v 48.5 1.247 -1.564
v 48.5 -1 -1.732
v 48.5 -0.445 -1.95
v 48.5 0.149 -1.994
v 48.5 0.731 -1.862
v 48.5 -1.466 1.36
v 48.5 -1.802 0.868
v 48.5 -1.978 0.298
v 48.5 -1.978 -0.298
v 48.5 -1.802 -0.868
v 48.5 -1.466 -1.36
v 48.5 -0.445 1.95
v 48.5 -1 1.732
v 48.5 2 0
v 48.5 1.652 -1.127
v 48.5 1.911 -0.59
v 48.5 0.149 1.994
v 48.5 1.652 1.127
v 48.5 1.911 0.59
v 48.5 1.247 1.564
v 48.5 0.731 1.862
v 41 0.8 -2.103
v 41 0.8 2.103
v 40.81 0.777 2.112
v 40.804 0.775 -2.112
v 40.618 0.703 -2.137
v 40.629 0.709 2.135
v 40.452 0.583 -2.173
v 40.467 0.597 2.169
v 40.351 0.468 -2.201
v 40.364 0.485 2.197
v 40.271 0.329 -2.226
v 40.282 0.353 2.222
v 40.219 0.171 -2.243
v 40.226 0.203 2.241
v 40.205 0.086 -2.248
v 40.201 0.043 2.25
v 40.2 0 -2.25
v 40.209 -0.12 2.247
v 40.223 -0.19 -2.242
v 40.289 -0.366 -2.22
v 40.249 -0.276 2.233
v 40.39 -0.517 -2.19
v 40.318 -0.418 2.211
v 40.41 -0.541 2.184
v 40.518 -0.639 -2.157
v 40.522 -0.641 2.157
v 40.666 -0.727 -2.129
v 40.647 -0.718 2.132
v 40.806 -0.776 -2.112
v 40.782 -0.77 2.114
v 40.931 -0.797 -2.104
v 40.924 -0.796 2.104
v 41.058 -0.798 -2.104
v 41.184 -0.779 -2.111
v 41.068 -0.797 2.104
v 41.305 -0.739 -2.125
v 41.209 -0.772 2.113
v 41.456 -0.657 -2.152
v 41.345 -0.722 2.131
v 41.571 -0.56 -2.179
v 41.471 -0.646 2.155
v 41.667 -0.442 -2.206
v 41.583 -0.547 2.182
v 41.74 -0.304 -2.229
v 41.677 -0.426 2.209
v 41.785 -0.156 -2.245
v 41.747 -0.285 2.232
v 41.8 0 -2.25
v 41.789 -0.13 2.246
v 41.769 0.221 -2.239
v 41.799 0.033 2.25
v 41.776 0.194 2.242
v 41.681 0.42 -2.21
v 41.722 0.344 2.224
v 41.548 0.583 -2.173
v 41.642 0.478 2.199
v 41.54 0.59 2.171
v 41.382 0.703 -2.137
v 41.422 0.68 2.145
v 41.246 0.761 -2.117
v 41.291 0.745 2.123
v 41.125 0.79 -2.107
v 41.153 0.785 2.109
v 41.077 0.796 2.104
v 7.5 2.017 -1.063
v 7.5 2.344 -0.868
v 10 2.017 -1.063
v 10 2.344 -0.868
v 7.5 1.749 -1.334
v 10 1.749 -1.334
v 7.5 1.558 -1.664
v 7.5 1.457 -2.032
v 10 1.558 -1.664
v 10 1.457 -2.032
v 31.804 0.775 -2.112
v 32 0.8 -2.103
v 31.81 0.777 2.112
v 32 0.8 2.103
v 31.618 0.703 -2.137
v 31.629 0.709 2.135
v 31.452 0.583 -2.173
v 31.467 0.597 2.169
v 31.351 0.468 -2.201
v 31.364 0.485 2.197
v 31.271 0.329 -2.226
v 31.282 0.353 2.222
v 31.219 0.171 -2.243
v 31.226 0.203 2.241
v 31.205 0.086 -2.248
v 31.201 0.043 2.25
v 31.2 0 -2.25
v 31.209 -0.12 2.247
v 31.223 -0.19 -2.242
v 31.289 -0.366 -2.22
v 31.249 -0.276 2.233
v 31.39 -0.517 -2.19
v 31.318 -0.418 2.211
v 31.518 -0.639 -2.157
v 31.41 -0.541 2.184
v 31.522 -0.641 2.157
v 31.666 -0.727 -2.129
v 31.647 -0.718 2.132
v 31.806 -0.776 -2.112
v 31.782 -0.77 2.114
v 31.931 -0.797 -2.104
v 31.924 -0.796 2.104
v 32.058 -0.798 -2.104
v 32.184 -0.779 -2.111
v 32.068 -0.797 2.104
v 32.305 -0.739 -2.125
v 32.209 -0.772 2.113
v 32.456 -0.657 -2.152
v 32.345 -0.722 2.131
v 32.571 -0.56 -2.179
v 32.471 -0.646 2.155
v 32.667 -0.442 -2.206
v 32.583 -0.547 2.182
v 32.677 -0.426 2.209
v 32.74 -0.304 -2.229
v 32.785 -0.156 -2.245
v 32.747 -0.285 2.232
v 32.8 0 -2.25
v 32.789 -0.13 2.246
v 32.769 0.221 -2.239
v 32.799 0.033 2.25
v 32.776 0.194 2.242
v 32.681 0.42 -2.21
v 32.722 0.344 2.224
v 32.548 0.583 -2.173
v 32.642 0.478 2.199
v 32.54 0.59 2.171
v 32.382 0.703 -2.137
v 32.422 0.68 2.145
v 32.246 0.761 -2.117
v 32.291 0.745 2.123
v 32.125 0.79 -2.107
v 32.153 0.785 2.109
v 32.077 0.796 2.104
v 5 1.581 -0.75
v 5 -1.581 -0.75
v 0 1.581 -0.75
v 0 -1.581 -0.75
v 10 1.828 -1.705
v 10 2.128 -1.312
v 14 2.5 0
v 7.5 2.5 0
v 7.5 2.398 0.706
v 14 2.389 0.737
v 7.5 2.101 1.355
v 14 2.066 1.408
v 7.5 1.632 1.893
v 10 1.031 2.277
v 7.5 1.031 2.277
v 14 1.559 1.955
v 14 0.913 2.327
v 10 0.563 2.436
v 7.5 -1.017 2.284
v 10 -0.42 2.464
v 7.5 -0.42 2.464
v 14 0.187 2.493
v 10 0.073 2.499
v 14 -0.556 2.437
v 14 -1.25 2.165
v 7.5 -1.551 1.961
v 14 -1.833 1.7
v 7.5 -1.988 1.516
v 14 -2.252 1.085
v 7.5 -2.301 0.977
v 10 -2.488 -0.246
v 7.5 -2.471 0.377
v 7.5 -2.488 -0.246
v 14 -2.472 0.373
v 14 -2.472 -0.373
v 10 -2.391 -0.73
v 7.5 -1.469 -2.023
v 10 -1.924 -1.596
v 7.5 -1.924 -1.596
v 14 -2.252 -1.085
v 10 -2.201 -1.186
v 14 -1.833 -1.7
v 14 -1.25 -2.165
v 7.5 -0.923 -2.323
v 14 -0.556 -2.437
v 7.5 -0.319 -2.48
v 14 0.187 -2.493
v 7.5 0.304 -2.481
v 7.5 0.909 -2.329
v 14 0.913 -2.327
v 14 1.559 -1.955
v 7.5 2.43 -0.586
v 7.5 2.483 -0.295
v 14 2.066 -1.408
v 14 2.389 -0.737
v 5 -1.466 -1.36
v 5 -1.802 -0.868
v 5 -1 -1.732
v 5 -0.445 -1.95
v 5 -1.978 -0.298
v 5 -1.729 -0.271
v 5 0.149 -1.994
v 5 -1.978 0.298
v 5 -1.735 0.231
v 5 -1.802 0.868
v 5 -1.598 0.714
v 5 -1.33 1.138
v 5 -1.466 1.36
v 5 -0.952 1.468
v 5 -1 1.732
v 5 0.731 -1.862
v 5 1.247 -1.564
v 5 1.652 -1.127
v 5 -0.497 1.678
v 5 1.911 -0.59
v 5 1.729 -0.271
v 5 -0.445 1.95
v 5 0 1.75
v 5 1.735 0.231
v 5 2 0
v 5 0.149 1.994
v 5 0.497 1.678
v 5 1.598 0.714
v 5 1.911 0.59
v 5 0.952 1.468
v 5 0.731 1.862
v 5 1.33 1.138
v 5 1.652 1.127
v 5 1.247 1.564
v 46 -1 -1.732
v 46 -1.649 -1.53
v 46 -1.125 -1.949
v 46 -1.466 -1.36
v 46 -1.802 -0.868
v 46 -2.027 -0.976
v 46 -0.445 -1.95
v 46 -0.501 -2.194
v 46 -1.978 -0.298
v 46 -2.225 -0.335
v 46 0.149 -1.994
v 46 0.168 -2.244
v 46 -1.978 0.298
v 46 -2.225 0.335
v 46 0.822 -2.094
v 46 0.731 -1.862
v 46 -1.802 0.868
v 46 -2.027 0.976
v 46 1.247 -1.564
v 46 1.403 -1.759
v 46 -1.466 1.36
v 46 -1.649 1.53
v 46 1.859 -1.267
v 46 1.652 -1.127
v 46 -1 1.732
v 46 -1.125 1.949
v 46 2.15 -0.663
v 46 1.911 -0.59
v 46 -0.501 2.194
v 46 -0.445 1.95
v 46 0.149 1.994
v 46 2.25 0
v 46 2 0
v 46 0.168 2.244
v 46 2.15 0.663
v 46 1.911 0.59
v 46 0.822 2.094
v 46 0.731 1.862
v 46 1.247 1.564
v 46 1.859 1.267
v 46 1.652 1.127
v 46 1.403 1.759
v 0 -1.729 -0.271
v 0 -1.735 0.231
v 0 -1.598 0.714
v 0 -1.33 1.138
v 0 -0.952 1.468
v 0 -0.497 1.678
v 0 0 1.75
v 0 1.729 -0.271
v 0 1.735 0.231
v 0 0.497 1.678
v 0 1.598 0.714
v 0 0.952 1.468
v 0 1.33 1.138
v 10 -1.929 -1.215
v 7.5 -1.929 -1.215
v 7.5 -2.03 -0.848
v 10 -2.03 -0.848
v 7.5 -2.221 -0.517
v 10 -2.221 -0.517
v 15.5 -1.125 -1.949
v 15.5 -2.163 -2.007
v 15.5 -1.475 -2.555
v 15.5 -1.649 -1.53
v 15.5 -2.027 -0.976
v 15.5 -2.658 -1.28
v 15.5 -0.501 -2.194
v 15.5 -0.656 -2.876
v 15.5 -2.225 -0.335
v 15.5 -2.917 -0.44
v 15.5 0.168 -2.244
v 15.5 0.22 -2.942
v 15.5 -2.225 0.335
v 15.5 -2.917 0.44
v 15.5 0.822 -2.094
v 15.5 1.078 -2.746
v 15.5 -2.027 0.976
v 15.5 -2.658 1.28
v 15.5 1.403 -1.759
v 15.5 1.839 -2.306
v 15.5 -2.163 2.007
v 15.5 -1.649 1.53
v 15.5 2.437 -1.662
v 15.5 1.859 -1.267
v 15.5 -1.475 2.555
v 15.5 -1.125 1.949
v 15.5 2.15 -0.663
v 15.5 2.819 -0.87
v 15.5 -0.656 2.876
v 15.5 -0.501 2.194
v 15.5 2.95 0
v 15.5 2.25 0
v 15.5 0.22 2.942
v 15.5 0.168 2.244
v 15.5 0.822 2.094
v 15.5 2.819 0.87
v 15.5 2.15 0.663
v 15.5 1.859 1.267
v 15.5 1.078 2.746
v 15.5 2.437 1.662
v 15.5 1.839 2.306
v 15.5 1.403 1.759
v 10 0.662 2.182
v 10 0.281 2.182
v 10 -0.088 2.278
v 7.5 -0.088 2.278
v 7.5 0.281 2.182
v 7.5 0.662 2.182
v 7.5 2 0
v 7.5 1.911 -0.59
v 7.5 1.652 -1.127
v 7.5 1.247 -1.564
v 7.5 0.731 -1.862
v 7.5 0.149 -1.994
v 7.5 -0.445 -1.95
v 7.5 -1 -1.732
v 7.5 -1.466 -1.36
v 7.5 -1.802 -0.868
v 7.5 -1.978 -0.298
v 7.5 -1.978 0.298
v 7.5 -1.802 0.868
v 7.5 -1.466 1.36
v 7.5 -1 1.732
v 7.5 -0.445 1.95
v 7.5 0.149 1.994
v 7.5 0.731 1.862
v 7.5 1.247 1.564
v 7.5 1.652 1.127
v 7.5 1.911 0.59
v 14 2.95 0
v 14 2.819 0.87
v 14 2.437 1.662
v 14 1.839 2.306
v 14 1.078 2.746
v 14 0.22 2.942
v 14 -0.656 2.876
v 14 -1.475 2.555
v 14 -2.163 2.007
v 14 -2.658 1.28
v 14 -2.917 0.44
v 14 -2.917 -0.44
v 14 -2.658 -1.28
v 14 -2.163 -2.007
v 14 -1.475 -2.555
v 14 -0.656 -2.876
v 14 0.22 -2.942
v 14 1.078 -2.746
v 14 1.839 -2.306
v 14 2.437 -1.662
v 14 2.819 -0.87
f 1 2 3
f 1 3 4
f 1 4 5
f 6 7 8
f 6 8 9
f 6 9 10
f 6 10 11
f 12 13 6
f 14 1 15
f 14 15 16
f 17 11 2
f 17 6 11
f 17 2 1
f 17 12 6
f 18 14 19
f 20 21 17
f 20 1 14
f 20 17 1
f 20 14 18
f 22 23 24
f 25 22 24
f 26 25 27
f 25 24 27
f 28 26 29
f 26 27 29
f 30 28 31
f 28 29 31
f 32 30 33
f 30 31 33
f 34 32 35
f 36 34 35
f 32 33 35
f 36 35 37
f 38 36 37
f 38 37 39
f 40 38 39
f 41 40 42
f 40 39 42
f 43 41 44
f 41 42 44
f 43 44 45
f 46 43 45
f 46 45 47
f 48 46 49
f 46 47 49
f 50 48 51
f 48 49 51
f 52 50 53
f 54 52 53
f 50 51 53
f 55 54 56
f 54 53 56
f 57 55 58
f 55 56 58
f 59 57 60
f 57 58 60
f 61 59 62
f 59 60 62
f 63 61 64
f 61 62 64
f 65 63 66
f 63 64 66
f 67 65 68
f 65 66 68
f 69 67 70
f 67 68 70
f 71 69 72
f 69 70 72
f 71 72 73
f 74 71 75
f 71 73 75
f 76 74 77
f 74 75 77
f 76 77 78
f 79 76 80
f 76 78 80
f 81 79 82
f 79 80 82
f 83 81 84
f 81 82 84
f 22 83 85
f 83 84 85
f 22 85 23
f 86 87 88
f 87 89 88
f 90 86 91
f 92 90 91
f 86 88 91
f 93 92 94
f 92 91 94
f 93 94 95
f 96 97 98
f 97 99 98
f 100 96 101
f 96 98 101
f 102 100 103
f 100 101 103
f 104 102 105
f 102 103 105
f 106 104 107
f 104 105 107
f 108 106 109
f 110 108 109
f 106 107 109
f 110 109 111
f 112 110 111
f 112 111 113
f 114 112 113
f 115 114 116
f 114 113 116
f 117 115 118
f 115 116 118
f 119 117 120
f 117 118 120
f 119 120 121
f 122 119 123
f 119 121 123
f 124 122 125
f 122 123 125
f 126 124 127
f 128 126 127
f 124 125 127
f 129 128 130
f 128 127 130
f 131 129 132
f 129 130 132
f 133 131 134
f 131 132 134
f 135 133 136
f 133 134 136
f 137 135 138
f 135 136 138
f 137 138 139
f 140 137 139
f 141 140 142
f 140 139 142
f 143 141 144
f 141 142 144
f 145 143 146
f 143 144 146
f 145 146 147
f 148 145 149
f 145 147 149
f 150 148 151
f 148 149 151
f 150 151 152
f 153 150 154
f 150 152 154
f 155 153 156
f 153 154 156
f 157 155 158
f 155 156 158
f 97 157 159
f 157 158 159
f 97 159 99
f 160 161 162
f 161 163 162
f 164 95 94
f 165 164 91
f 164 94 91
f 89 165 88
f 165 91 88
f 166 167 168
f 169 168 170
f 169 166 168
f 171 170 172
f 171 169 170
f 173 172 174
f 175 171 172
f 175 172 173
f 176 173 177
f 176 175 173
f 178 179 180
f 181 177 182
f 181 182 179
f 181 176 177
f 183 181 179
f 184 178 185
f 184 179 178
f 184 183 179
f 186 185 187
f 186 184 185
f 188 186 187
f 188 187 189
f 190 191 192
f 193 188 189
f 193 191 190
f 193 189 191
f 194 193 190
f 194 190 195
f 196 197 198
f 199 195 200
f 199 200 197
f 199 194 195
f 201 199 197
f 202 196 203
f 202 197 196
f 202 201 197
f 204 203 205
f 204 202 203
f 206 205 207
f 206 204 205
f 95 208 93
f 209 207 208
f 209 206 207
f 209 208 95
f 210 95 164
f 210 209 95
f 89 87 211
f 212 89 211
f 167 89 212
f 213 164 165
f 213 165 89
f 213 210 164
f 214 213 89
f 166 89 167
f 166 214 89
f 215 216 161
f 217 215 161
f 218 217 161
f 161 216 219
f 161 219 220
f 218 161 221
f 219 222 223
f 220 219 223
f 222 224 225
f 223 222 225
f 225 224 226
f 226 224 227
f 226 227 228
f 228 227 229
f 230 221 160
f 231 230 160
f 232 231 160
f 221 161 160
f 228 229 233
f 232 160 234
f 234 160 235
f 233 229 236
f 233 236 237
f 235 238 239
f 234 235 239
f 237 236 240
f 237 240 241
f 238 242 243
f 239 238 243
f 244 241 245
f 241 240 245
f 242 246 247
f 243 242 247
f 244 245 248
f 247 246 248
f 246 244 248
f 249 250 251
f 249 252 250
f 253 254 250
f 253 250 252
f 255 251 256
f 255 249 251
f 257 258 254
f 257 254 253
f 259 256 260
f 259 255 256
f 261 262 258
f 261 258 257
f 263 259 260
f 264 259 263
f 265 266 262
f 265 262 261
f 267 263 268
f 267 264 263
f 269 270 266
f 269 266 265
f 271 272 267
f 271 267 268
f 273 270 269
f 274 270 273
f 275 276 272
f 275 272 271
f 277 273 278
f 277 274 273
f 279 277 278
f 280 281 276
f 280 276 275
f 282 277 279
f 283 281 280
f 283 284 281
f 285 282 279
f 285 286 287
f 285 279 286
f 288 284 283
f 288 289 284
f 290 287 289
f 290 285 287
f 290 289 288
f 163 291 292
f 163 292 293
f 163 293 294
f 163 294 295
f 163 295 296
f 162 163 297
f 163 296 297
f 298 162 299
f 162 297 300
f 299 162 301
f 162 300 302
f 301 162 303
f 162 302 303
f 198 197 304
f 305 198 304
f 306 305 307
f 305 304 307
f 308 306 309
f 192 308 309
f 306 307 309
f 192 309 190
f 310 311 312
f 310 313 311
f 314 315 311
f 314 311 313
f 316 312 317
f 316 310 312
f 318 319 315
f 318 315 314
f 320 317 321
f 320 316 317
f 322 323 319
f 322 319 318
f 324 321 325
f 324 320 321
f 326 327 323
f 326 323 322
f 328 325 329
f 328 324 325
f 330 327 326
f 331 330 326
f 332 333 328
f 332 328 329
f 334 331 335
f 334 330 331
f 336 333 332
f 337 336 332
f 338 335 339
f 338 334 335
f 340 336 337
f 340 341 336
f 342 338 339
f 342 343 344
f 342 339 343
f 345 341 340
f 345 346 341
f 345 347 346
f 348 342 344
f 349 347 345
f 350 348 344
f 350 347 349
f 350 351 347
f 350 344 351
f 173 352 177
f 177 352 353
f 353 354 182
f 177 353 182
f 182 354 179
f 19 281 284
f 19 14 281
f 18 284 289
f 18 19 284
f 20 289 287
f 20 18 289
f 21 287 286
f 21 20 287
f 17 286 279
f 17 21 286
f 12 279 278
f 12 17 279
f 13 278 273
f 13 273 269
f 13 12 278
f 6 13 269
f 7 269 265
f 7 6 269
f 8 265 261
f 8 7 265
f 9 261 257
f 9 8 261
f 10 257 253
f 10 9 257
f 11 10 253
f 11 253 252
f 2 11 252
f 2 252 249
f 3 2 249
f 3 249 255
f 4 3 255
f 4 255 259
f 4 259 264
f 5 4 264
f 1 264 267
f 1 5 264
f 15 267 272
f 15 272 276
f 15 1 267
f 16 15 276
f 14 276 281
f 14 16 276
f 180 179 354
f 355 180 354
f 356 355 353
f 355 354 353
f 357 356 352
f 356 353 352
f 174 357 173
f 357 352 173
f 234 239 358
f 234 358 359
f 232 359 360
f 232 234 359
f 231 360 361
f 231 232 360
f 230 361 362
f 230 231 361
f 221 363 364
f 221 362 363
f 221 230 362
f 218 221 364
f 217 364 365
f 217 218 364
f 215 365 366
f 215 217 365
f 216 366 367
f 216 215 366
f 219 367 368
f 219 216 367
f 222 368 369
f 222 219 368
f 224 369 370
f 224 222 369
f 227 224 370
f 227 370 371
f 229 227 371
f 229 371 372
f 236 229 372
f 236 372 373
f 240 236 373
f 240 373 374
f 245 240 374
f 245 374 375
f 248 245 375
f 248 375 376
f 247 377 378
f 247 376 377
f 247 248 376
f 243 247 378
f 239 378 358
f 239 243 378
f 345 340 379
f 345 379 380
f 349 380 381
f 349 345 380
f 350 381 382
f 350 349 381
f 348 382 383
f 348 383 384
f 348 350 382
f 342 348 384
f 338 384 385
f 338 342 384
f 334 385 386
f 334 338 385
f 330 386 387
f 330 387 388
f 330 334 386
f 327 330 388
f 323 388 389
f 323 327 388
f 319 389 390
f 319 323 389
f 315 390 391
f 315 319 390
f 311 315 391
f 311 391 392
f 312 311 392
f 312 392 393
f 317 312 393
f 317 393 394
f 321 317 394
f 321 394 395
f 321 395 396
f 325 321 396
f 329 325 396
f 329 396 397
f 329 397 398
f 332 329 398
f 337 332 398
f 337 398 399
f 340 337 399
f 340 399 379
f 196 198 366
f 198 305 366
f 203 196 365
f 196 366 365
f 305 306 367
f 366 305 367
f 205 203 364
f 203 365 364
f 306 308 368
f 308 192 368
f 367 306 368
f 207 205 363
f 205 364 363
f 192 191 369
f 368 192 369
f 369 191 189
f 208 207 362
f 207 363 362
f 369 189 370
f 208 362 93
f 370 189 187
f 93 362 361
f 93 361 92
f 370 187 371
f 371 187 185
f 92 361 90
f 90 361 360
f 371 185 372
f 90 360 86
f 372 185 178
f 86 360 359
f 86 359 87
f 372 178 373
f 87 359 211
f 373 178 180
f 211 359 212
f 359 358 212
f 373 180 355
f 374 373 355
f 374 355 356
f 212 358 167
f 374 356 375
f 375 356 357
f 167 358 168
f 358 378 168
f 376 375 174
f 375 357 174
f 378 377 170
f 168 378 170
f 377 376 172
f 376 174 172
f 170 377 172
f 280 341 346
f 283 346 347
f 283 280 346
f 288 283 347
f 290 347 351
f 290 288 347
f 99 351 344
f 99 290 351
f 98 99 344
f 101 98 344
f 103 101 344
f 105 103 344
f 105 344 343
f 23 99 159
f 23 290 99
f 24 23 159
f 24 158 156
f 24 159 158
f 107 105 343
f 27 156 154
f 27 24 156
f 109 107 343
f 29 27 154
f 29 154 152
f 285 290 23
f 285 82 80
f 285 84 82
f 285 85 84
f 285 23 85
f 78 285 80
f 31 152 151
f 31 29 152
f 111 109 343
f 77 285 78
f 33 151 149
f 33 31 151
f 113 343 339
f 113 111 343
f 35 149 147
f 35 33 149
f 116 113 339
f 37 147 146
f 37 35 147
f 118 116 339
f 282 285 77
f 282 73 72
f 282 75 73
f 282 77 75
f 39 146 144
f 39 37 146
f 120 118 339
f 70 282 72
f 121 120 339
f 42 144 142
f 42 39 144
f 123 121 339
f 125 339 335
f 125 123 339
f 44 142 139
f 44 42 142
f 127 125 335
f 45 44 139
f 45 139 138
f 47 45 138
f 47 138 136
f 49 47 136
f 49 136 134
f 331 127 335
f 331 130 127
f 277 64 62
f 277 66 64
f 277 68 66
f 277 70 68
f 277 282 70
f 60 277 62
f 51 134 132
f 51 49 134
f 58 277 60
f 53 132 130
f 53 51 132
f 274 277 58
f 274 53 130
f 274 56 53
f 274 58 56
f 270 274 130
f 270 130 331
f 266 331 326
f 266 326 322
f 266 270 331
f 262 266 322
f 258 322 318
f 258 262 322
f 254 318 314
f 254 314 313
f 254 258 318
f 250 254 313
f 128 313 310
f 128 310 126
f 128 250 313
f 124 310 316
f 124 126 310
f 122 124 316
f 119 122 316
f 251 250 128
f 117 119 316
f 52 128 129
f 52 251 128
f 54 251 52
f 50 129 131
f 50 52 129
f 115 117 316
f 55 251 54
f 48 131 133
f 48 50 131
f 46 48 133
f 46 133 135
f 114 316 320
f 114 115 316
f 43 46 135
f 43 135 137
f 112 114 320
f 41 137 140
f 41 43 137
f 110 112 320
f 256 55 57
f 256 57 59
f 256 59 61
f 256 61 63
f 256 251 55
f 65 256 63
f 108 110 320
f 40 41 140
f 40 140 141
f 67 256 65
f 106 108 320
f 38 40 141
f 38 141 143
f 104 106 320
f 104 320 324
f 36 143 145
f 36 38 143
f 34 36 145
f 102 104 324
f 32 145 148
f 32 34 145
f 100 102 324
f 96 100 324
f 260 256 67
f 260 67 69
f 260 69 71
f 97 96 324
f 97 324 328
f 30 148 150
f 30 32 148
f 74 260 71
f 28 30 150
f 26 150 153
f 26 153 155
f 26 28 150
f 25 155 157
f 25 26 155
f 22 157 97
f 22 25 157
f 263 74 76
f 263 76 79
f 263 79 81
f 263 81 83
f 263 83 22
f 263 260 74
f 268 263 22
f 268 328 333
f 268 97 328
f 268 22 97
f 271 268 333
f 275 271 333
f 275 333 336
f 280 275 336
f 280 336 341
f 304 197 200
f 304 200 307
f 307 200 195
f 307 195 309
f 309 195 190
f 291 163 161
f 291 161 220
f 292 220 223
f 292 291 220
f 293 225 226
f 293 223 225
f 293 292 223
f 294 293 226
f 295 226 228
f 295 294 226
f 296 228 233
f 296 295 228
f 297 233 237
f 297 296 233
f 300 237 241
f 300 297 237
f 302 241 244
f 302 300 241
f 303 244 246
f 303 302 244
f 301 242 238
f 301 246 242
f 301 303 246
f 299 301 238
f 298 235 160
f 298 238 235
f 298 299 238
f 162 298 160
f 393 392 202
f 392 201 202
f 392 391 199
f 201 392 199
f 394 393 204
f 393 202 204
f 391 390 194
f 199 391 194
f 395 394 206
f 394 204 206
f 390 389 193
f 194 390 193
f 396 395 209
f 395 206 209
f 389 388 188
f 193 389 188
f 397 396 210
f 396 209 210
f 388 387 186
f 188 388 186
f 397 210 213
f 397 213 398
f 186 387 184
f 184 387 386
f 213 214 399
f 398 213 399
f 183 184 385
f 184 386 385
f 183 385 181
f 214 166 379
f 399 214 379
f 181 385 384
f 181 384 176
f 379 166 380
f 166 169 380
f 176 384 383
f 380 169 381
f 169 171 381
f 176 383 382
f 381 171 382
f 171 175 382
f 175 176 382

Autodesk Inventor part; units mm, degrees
ref_plane "YZ Plane" through (0, 0, 0) normal (1, 0, 0) x (0, 1, 0)
ref_plane "XZ Plane" through (0, 0, 0) normal (0, 1, 0) x (-1, 0, 0)
sketch "Sketch1" plane through (0, 0, 0) normal (0, 0, 1) x (1, 0, 0)
  line L0 (7.5, 2.5) -> (14, 2.5)
  line L1 (15.5, 2.25) -> (46, 2.25)
  line L2 (46, 2.25) -> (46, 2)
  line L3 (46, 2) -> (48.5, 2)
  line L4 (7.5, 2.5) -> (7.5, 2)
  line L5 (7.5, 2) -> (5, 2)
  line L6 (0, 0) -> (48.5, 0)
  line L7 (48.5, 0) -> (48.5, 2)
  line L8 (14, 2.5) -> (14, 2.95)
  line L9 (14, 2.95) -> (15.5, 2.95)
  line L10 (15.5, 2.95) -> (15.5, 2.25)
  line L11 (5, 2) -> (5, 1.75)
  line L12 (5, 1.75) -> (0, 1.75)
  line L13 (0, 1.75) -> (0, 0)
  dimension "d37" = 3.7
  dimension "d45" = 7.34
  dimension "d4" = 2.5
  dimension "d5" = 4.5
  dimension "d6" = 5
  dimension "d7" = 4
  dimension "d8" = 4
  dimension "d12" = 32
  dimension "d13" = 6.5
  dimension "d14" = 1.5
  dimension "d15" = 5.9
  dimension "d25" = 2.5
  dimension "d26" = 5
  dimension "d27" = 3.5
revolve "Revolution1" add sketch "Sketch1" angle 360 about axis through (0, 0, 0) along (1, 0, 0)
ref_plane "Work Plane1" through (30.75, 0, -2.25) normal (0, 0, 1) x (1, 0, 0)
sketch "Sketch2" plane through (30.75, 0, -2.25) normal (0, 0, 1) x (1, 0, 0)
  line L0 (-16.75, -2.95) -> (-16.75, 2.95) projected
  line L1 (-30.75, 0) -> (16.721, 0) construction
  point P0 (1.25, 0)
  point P1 (10.25, 0)
  dimension "d16" = 18
  dimension "d17" = 27
hole "Hole1" at (32, 0, -2.25) at (41, 0, -2.25) direction (0, 0, 1) diameter 1.6 end through all
sketch "Sketch4" plane through (14, 0, 0) normal (-1, 0, 0) x (0, 0, 1)
  line L0 (0.75, -2.95) -> (-0.75, -2.95)
  line L1 (-0.75, -2.95) -> (-0.75, -10)
  line L2 (-0.75, -10) -> (0.75, -10)
  line L3 (0.75, -10) -> (0.75, -2.95)
  line L4 (0, 0) -> (0, -9.1569) construction
  dimension "d28" = 1.5
  dimension "d29" = 2.95
  dimension "d30" = 10
extrude "Extrusion1" [suppressed]
pattern_circular "Circular Pattern1" [suppressed]
sketch "Sketch5" plane through (7.5, 0, 0) normal (-1, 0, 0) x (0, 0, 1)
  line L0 (1.4255, 3.4144) -> (3.6697, 0.4727) construction
  line L1 (3.6697, 0.4727) -> (2.2442, -2.9417) construction
  line L2 (2.2442, -2.9417) -> (-1.4255, -3.4144) construction
  line L3 (-1.4255, -3.4144) -> (-3.6697, -0.4727) construction
  line L4 (-3.6697, -0.4727) -> (-2.2442, 2.9417) construction
  line L5 (-2.2442, 2.9417) -> (1.4255, 3.4144) construction
  line L6 (0, 0) -> (11.1686, 0) construction
  dimension "d37" = 3.7
  dimension "d45" = 7.34
hole "Hole2" at (7.5, -3.4144, -1.4255) at (7.5, 0.4727, 3.6697) at (7.5, 2.9417, -2.2442) direction (1, 0, 0) diameter 3 depth 2.5
sketch "Sketch6" plane through (0, 0, 0) normal (-1, 0, 0) x (0, 0, 1)
  circle A0 centre (0, 0) radius 1.75 projected
  line L0 (-0.75, -1.5811) -> (-0.75, 1.5811)
  dimension "d46" = 0.75
extrude "Extrusion2" cut sketch "Sketch6" against normal up to surface (5 mm away) contours L0 A0 picked at (-1.0833, 0)
properties part number "thumb_03 CMC shaft" material "Stainless Steel"
